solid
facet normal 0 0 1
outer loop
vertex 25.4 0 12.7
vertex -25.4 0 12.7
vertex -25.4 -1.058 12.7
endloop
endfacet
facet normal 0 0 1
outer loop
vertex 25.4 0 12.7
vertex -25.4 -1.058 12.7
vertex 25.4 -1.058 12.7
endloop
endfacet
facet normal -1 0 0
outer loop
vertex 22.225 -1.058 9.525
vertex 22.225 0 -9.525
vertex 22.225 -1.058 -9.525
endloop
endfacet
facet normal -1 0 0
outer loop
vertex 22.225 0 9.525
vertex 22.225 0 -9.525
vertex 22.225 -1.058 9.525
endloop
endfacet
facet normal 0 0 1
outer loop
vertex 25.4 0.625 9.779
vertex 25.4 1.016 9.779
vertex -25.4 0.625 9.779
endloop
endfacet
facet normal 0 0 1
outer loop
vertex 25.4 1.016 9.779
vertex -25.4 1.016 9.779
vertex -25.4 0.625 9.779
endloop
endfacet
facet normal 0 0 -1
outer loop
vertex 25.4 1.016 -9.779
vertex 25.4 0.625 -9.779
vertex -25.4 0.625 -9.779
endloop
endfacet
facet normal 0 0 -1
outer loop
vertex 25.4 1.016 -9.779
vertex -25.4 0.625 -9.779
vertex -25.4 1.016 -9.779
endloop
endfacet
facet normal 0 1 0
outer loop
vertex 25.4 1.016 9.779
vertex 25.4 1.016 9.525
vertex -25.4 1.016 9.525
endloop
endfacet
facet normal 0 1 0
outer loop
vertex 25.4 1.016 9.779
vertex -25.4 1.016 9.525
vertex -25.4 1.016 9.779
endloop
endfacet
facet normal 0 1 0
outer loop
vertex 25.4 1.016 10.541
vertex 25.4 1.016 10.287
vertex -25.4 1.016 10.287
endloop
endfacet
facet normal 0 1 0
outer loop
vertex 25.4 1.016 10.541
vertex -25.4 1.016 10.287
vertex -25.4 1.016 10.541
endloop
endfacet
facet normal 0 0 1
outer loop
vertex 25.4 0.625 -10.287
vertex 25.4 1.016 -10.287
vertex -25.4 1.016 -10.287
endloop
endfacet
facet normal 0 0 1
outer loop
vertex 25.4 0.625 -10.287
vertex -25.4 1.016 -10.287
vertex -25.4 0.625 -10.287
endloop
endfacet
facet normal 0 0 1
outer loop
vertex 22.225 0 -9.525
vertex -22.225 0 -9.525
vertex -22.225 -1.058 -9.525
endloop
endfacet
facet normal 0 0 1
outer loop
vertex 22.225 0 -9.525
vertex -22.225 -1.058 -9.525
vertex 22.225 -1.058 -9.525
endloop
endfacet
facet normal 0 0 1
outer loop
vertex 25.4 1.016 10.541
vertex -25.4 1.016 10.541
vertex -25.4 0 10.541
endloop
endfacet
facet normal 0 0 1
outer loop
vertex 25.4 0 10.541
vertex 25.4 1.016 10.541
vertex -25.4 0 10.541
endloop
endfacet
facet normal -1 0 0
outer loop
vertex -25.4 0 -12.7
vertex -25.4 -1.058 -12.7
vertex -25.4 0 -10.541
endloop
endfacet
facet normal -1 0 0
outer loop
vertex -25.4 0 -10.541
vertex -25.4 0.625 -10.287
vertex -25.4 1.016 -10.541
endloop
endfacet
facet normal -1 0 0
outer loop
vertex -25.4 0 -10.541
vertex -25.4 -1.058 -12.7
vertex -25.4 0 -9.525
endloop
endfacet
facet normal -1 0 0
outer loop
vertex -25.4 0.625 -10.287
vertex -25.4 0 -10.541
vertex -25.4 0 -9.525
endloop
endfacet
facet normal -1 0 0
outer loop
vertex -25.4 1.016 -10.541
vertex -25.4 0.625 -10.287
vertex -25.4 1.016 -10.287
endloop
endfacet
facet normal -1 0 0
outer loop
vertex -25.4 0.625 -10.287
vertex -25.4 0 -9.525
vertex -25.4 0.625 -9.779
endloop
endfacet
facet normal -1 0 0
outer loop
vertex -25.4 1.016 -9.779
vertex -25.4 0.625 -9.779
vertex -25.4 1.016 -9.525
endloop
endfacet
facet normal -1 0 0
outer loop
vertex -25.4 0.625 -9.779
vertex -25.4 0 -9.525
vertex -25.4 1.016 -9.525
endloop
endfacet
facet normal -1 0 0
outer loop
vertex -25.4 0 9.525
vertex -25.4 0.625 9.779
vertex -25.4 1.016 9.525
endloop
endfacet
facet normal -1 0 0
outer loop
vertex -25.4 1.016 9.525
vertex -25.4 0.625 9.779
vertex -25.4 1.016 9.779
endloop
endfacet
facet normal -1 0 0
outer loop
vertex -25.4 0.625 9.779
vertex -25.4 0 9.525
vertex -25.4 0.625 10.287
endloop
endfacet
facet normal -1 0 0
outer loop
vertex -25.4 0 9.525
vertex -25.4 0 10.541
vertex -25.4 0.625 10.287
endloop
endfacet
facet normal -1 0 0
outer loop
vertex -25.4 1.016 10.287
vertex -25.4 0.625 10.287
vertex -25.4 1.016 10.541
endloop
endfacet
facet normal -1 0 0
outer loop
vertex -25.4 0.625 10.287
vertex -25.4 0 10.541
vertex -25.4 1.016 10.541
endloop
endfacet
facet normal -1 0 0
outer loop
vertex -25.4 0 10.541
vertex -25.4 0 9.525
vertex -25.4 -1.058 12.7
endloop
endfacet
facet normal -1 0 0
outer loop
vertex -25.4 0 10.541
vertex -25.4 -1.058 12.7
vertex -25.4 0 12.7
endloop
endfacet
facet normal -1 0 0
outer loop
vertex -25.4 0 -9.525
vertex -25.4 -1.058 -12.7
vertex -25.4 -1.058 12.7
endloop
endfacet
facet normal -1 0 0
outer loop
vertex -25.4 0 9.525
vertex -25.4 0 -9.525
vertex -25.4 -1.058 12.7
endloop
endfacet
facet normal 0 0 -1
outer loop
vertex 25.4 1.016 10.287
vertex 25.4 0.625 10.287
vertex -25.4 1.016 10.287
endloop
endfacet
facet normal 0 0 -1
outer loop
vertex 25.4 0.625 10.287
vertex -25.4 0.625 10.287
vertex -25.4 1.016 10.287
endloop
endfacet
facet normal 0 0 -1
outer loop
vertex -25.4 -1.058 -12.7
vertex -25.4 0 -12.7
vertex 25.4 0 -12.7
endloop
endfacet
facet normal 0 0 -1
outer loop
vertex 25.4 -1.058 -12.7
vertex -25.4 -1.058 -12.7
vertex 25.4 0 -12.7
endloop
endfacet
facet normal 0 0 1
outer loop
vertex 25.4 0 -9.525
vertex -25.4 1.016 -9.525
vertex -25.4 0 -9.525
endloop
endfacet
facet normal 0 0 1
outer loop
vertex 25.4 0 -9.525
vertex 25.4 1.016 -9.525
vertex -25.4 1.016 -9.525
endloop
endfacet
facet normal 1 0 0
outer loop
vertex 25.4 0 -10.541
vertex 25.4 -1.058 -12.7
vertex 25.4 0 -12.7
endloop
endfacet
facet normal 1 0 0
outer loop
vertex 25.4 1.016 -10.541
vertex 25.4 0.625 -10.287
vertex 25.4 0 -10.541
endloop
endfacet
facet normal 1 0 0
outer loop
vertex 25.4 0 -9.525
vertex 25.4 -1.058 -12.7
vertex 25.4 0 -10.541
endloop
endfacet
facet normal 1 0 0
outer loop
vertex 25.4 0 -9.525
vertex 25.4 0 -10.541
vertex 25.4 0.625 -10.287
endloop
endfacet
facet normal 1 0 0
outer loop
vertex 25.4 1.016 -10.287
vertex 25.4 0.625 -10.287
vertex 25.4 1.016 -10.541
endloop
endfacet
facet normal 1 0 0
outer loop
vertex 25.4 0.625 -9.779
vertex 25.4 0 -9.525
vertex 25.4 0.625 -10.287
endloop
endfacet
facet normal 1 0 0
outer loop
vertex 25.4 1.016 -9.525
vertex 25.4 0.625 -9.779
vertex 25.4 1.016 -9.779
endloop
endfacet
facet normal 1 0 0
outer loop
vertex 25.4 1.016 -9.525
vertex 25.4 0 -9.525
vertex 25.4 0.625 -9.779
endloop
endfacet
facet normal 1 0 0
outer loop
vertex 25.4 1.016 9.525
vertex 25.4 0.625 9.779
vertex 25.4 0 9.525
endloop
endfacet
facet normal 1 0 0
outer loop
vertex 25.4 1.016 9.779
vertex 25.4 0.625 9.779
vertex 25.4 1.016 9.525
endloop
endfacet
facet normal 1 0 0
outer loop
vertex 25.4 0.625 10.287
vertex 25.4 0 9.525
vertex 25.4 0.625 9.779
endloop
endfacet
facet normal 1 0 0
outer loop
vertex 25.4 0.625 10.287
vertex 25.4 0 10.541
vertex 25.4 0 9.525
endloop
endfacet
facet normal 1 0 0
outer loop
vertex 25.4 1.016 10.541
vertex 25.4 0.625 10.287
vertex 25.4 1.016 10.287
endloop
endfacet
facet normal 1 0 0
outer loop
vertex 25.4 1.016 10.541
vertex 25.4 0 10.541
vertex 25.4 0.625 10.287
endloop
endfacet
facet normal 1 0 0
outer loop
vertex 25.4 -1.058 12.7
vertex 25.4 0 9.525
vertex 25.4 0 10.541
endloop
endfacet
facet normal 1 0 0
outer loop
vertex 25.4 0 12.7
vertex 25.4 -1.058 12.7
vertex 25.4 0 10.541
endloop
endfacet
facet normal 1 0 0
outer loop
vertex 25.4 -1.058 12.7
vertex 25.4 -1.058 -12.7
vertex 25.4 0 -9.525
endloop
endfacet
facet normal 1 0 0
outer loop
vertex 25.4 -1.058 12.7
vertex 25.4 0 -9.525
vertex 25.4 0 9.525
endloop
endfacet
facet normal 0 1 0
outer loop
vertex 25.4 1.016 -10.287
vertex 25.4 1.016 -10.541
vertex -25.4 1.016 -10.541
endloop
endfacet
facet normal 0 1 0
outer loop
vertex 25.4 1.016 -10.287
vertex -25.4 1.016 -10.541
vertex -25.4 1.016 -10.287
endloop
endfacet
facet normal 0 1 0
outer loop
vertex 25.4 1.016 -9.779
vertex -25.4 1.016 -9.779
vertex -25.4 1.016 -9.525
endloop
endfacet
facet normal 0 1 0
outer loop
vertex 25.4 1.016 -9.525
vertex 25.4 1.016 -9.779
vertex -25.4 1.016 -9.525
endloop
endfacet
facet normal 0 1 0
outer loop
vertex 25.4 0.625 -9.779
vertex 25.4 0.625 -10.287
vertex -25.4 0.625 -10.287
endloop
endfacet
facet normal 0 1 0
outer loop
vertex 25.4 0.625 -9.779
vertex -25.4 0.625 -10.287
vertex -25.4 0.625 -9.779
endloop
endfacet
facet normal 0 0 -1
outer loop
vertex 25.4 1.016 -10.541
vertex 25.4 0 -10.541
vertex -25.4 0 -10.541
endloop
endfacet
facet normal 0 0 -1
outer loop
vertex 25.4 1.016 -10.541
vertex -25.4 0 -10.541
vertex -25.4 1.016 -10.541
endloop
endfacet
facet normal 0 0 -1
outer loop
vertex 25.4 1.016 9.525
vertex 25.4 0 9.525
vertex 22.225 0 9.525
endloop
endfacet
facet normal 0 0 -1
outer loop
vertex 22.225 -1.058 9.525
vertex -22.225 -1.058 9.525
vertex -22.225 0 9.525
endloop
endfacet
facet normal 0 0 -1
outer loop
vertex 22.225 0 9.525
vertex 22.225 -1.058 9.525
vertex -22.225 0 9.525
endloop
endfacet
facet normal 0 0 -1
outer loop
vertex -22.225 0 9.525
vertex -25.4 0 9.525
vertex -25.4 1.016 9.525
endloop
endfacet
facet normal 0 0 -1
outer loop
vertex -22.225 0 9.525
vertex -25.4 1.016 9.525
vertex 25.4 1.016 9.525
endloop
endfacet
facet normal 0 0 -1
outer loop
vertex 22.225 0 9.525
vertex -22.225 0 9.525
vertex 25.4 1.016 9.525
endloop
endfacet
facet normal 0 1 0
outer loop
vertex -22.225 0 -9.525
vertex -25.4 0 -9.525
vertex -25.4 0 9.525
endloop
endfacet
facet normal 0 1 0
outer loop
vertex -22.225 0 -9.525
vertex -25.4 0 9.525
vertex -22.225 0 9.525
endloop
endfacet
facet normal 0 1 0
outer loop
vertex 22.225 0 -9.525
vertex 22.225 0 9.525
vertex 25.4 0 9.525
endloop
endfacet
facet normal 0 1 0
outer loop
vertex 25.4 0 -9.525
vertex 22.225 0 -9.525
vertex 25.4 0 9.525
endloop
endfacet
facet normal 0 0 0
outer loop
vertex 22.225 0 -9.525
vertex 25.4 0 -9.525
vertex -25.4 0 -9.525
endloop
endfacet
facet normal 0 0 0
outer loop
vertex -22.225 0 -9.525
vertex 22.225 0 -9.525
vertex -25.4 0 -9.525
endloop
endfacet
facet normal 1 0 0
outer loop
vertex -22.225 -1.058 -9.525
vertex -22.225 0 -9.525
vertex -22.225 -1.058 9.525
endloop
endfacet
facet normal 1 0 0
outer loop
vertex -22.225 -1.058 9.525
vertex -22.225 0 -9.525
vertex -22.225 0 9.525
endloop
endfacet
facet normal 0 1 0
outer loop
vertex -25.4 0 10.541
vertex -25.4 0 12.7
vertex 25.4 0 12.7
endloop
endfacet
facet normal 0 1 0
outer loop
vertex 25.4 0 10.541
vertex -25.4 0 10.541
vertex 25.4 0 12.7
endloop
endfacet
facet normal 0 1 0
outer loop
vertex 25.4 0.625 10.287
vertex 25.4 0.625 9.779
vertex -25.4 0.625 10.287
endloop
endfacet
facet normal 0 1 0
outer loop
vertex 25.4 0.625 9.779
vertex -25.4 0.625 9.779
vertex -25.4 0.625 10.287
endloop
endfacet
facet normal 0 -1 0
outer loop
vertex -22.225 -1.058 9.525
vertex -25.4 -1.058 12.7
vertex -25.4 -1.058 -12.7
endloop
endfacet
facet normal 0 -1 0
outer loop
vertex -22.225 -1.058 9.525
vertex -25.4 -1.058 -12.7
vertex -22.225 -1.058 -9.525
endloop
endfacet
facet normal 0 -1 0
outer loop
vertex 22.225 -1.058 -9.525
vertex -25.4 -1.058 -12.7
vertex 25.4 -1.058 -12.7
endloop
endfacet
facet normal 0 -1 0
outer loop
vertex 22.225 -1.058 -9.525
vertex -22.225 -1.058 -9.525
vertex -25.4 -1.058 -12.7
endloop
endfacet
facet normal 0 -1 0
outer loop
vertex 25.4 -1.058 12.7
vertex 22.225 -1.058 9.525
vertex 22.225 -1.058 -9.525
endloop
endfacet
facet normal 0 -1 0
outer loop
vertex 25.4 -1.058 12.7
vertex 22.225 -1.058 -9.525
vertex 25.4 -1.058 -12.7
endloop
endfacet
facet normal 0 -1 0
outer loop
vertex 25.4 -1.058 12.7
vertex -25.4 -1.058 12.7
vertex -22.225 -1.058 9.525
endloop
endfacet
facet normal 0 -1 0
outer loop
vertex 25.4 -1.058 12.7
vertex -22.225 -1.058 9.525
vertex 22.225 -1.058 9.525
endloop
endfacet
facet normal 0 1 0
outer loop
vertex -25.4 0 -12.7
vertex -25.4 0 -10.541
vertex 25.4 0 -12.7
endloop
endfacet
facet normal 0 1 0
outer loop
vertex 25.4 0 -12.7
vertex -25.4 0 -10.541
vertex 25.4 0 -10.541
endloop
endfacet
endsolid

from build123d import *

# Parameters (mm, degrees)
F0_W     = 50.8
F0_H     = 25.4
F0_W_2   = 44.45
F0_H_2   = 19.05
F1_DEPTH = 1.058333
F3_DEPTH = 25.4


with BuildPart() as f1:
    # F0 (on Front) → F1 (new body)
    with BuildSketch(Plane.XZ):
        Rectangle(F0_W, F0_H)
        Rectangle(F0_W_2, F0_H_2, mode=Mode.SUBTRACT)
    extrude(amount=F1_DEPTH)

    # F2 (on Right) → F3 (join, symmetric)
    with BuildSketch(Plane.YZ):
        Polygon((0, 10.541), (0, 9.525), (1.016, 9.525), (1.016, 9.779), (0.625132, 9.779), (0.625132, 10.287), (1.016, 10.287), (1.016, 10.541), align=None)
        Polygon((0, -9.525007), (0, -10.541007), (1.016, -10.541007), (1.016, -10.287007), (0.625132, -10.287007), (0.625132, -9.779007), (1.016, -9.779007), (1.016, -9.525007), align=None)
    extrude(amount=F3_DEPTH, both=True)


solid = f1.part
